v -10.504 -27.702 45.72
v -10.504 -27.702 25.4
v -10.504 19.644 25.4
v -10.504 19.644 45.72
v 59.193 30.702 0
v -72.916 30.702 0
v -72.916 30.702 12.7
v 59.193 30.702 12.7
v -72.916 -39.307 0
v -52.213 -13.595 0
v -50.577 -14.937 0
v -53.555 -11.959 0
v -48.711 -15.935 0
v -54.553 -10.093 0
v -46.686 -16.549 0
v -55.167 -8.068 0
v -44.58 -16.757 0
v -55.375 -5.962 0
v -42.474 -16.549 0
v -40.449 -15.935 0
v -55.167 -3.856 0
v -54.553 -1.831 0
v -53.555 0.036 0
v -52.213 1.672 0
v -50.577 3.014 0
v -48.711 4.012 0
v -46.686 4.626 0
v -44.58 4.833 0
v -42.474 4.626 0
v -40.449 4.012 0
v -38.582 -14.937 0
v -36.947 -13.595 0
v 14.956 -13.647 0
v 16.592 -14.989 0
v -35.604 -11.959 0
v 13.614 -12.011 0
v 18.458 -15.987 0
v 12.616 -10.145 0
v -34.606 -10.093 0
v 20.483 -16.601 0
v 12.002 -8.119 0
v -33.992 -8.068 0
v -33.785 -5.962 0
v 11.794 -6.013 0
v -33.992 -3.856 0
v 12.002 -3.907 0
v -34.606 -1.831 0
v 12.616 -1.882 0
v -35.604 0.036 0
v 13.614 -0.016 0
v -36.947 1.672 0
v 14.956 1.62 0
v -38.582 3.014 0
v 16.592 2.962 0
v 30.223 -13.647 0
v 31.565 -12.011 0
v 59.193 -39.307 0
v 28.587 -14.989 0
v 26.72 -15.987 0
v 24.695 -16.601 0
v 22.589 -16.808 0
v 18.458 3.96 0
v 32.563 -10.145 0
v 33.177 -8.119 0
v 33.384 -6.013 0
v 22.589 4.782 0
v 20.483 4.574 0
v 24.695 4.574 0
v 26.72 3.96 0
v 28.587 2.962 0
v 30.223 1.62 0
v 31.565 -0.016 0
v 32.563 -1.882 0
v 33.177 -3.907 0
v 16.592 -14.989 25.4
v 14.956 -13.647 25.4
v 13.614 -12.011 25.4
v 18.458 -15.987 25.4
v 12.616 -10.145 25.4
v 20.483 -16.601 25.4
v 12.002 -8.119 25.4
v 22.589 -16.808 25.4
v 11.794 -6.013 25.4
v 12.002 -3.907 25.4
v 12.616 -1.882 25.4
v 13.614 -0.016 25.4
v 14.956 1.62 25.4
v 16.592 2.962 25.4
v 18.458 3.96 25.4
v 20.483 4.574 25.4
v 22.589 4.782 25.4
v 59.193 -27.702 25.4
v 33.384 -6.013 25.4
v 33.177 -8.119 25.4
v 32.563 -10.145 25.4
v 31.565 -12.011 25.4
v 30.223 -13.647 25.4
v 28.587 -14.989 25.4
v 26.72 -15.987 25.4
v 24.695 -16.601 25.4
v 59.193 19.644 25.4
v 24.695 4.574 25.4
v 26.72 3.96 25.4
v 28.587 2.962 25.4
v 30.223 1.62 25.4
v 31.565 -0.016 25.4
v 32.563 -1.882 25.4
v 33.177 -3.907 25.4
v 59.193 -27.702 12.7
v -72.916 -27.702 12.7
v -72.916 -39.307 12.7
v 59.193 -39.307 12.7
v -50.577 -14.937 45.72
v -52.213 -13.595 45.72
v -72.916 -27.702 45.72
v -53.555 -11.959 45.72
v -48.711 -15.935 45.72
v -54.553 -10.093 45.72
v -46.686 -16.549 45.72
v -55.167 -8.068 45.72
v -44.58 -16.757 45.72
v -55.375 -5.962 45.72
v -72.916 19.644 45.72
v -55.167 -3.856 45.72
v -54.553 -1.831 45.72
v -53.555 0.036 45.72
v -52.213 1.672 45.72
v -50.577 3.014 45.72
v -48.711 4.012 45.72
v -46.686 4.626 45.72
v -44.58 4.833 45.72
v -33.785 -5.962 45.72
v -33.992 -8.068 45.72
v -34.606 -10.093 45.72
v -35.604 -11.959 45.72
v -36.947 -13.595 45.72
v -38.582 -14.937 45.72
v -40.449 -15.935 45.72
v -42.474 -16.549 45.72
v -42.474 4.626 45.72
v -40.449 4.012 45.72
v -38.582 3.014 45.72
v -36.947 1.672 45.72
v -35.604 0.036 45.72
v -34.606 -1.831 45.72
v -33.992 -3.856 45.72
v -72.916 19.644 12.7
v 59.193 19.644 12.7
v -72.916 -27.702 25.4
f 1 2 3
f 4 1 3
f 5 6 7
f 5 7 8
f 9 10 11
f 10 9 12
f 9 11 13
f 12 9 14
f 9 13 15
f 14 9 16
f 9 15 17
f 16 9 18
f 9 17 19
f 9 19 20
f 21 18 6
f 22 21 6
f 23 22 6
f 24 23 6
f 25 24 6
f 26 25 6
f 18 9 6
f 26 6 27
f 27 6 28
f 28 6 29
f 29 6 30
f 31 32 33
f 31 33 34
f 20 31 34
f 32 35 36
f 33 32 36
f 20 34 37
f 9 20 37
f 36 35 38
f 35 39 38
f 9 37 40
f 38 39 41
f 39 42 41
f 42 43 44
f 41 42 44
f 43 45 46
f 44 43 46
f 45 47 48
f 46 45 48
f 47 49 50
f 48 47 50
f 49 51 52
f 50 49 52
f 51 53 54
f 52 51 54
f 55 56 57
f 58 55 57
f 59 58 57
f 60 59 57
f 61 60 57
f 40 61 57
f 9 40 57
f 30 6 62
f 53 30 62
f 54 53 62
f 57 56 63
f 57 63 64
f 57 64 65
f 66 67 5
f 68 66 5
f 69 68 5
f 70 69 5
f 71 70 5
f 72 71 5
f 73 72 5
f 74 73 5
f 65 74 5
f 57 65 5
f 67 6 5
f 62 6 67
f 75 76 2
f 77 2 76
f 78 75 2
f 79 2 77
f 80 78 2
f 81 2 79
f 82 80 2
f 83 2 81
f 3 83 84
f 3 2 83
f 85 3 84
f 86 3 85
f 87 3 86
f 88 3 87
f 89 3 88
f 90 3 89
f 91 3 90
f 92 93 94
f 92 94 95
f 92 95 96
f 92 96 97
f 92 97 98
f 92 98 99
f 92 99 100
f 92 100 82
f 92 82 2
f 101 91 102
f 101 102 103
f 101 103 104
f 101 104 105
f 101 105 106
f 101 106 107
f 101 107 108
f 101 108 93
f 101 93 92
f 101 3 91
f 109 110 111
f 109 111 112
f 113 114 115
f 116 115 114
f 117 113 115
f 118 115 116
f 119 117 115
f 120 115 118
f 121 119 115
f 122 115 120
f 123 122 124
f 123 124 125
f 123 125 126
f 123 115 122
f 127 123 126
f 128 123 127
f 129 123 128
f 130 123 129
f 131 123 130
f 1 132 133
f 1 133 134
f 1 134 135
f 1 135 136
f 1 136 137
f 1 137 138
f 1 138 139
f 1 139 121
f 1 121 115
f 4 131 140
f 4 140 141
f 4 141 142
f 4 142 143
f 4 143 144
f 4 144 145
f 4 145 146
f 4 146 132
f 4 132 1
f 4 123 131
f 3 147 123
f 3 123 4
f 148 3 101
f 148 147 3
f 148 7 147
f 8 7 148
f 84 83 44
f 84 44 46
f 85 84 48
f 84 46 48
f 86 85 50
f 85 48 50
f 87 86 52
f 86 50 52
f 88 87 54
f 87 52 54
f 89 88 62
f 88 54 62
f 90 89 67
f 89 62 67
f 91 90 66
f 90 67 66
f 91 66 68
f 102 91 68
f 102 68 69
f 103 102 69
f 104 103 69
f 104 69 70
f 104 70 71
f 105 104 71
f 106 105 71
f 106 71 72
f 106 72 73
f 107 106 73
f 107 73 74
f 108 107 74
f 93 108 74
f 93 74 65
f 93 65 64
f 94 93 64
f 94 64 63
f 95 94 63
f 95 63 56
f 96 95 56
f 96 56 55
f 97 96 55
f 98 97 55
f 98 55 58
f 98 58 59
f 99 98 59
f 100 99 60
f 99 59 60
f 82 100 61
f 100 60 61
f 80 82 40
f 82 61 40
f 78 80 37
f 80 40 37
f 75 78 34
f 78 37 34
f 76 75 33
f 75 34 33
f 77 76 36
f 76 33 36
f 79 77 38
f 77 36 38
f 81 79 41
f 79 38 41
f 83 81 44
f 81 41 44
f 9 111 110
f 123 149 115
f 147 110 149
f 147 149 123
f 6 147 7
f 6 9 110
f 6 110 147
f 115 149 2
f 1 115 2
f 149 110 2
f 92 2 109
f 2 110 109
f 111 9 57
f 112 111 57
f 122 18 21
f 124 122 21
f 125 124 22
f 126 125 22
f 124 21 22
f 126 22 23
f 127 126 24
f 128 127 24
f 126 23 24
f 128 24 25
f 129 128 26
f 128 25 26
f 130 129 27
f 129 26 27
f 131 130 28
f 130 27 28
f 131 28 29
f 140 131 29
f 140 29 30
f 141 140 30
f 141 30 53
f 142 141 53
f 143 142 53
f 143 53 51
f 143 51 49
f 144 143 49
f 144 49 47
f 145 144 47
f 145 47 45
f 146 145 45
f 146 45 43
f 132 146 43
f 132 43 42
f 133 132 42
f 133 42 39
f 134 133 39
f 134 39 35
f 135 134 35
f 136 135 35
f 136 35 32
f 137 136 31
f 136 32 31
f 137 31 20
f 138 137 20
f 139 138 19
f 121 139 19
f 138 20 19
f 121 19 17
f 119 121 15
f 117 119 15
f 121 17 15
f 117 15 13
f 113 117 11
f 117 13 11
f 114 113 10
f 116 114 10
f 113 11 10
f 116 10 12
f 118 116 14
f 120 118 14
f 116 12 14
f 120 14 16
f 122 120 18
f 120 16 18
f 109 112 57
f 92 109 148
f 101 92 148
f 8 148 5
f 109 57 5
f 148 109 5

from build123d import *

# Parameters (mm, degrees)
F0_W     = 132.1095339954
F0_H     = 70.0087491423
F1_DEPTH = 25.4
F2_W     = 132.1095339954
F2_H     = 11.6047412157
F3_DEPTH = 12.7
F4_W     = 132.1095339954
F4_H     = 11.0577493906
F5_DEPTH = 12.7
F6_W     = 62.4120058492
F6_H     = 47.346258536
F7_DEPTH = 20.32
F10_D    = 21.59
F12_D    = 21.59


with BuildPart() as f1:
    # F0 (on Top) → F1 (new body)
    with BuildSketch(Plane.XY):
        with Locations((-6.8613234907, -4.3028621003)):
            Rectangle(F0_W, F0_H)
    extrude(amount=F1_DEPTH)

    # F2 (on face) → F3 (cut)
    with BuildSketch(Plane.XY.offset(25.4)):
        with Locations((-6.8613234907, -33.5048660636)):
            Rectangle(F2_W, F2_H)
    extrude(amount=-F3_DEPTH, mode=Mode.SUBTRACT)

    # F4 (on face) → F5 (cut)
    with BuildSketch(Plane.XY.offset(25.4)):
        with Locations((-6.8613234907, 25.1726377755)):
            Rectangle(F4_W, F4_H)
    extrude(amount=-F5_DEPTH, mode=Mode.SUBTRACT)

    # F6 (on face) → F7 (join)
    with BuildSketch(Plane.XY.offset(25.4)):
        with Locations((-41.7100875638, -4.0293661878)):
            Rectangle(F6_W, F6_H)
    extrude(amount=F7_DEPTH)

    # F10 (through all)
    with Locations(Plane.XY.offset(45.72)):
        with Locations((-44.5797219872, -5.9616966173)):
            Hole(F10_D / 2)

    # F12 (through all)
    with Locations(Plane.XY.offset(25.4)):
        with Locations((22.5894171745, -6.0134478845)):
            Hole(F12_D / 2)


solid = f1.part
